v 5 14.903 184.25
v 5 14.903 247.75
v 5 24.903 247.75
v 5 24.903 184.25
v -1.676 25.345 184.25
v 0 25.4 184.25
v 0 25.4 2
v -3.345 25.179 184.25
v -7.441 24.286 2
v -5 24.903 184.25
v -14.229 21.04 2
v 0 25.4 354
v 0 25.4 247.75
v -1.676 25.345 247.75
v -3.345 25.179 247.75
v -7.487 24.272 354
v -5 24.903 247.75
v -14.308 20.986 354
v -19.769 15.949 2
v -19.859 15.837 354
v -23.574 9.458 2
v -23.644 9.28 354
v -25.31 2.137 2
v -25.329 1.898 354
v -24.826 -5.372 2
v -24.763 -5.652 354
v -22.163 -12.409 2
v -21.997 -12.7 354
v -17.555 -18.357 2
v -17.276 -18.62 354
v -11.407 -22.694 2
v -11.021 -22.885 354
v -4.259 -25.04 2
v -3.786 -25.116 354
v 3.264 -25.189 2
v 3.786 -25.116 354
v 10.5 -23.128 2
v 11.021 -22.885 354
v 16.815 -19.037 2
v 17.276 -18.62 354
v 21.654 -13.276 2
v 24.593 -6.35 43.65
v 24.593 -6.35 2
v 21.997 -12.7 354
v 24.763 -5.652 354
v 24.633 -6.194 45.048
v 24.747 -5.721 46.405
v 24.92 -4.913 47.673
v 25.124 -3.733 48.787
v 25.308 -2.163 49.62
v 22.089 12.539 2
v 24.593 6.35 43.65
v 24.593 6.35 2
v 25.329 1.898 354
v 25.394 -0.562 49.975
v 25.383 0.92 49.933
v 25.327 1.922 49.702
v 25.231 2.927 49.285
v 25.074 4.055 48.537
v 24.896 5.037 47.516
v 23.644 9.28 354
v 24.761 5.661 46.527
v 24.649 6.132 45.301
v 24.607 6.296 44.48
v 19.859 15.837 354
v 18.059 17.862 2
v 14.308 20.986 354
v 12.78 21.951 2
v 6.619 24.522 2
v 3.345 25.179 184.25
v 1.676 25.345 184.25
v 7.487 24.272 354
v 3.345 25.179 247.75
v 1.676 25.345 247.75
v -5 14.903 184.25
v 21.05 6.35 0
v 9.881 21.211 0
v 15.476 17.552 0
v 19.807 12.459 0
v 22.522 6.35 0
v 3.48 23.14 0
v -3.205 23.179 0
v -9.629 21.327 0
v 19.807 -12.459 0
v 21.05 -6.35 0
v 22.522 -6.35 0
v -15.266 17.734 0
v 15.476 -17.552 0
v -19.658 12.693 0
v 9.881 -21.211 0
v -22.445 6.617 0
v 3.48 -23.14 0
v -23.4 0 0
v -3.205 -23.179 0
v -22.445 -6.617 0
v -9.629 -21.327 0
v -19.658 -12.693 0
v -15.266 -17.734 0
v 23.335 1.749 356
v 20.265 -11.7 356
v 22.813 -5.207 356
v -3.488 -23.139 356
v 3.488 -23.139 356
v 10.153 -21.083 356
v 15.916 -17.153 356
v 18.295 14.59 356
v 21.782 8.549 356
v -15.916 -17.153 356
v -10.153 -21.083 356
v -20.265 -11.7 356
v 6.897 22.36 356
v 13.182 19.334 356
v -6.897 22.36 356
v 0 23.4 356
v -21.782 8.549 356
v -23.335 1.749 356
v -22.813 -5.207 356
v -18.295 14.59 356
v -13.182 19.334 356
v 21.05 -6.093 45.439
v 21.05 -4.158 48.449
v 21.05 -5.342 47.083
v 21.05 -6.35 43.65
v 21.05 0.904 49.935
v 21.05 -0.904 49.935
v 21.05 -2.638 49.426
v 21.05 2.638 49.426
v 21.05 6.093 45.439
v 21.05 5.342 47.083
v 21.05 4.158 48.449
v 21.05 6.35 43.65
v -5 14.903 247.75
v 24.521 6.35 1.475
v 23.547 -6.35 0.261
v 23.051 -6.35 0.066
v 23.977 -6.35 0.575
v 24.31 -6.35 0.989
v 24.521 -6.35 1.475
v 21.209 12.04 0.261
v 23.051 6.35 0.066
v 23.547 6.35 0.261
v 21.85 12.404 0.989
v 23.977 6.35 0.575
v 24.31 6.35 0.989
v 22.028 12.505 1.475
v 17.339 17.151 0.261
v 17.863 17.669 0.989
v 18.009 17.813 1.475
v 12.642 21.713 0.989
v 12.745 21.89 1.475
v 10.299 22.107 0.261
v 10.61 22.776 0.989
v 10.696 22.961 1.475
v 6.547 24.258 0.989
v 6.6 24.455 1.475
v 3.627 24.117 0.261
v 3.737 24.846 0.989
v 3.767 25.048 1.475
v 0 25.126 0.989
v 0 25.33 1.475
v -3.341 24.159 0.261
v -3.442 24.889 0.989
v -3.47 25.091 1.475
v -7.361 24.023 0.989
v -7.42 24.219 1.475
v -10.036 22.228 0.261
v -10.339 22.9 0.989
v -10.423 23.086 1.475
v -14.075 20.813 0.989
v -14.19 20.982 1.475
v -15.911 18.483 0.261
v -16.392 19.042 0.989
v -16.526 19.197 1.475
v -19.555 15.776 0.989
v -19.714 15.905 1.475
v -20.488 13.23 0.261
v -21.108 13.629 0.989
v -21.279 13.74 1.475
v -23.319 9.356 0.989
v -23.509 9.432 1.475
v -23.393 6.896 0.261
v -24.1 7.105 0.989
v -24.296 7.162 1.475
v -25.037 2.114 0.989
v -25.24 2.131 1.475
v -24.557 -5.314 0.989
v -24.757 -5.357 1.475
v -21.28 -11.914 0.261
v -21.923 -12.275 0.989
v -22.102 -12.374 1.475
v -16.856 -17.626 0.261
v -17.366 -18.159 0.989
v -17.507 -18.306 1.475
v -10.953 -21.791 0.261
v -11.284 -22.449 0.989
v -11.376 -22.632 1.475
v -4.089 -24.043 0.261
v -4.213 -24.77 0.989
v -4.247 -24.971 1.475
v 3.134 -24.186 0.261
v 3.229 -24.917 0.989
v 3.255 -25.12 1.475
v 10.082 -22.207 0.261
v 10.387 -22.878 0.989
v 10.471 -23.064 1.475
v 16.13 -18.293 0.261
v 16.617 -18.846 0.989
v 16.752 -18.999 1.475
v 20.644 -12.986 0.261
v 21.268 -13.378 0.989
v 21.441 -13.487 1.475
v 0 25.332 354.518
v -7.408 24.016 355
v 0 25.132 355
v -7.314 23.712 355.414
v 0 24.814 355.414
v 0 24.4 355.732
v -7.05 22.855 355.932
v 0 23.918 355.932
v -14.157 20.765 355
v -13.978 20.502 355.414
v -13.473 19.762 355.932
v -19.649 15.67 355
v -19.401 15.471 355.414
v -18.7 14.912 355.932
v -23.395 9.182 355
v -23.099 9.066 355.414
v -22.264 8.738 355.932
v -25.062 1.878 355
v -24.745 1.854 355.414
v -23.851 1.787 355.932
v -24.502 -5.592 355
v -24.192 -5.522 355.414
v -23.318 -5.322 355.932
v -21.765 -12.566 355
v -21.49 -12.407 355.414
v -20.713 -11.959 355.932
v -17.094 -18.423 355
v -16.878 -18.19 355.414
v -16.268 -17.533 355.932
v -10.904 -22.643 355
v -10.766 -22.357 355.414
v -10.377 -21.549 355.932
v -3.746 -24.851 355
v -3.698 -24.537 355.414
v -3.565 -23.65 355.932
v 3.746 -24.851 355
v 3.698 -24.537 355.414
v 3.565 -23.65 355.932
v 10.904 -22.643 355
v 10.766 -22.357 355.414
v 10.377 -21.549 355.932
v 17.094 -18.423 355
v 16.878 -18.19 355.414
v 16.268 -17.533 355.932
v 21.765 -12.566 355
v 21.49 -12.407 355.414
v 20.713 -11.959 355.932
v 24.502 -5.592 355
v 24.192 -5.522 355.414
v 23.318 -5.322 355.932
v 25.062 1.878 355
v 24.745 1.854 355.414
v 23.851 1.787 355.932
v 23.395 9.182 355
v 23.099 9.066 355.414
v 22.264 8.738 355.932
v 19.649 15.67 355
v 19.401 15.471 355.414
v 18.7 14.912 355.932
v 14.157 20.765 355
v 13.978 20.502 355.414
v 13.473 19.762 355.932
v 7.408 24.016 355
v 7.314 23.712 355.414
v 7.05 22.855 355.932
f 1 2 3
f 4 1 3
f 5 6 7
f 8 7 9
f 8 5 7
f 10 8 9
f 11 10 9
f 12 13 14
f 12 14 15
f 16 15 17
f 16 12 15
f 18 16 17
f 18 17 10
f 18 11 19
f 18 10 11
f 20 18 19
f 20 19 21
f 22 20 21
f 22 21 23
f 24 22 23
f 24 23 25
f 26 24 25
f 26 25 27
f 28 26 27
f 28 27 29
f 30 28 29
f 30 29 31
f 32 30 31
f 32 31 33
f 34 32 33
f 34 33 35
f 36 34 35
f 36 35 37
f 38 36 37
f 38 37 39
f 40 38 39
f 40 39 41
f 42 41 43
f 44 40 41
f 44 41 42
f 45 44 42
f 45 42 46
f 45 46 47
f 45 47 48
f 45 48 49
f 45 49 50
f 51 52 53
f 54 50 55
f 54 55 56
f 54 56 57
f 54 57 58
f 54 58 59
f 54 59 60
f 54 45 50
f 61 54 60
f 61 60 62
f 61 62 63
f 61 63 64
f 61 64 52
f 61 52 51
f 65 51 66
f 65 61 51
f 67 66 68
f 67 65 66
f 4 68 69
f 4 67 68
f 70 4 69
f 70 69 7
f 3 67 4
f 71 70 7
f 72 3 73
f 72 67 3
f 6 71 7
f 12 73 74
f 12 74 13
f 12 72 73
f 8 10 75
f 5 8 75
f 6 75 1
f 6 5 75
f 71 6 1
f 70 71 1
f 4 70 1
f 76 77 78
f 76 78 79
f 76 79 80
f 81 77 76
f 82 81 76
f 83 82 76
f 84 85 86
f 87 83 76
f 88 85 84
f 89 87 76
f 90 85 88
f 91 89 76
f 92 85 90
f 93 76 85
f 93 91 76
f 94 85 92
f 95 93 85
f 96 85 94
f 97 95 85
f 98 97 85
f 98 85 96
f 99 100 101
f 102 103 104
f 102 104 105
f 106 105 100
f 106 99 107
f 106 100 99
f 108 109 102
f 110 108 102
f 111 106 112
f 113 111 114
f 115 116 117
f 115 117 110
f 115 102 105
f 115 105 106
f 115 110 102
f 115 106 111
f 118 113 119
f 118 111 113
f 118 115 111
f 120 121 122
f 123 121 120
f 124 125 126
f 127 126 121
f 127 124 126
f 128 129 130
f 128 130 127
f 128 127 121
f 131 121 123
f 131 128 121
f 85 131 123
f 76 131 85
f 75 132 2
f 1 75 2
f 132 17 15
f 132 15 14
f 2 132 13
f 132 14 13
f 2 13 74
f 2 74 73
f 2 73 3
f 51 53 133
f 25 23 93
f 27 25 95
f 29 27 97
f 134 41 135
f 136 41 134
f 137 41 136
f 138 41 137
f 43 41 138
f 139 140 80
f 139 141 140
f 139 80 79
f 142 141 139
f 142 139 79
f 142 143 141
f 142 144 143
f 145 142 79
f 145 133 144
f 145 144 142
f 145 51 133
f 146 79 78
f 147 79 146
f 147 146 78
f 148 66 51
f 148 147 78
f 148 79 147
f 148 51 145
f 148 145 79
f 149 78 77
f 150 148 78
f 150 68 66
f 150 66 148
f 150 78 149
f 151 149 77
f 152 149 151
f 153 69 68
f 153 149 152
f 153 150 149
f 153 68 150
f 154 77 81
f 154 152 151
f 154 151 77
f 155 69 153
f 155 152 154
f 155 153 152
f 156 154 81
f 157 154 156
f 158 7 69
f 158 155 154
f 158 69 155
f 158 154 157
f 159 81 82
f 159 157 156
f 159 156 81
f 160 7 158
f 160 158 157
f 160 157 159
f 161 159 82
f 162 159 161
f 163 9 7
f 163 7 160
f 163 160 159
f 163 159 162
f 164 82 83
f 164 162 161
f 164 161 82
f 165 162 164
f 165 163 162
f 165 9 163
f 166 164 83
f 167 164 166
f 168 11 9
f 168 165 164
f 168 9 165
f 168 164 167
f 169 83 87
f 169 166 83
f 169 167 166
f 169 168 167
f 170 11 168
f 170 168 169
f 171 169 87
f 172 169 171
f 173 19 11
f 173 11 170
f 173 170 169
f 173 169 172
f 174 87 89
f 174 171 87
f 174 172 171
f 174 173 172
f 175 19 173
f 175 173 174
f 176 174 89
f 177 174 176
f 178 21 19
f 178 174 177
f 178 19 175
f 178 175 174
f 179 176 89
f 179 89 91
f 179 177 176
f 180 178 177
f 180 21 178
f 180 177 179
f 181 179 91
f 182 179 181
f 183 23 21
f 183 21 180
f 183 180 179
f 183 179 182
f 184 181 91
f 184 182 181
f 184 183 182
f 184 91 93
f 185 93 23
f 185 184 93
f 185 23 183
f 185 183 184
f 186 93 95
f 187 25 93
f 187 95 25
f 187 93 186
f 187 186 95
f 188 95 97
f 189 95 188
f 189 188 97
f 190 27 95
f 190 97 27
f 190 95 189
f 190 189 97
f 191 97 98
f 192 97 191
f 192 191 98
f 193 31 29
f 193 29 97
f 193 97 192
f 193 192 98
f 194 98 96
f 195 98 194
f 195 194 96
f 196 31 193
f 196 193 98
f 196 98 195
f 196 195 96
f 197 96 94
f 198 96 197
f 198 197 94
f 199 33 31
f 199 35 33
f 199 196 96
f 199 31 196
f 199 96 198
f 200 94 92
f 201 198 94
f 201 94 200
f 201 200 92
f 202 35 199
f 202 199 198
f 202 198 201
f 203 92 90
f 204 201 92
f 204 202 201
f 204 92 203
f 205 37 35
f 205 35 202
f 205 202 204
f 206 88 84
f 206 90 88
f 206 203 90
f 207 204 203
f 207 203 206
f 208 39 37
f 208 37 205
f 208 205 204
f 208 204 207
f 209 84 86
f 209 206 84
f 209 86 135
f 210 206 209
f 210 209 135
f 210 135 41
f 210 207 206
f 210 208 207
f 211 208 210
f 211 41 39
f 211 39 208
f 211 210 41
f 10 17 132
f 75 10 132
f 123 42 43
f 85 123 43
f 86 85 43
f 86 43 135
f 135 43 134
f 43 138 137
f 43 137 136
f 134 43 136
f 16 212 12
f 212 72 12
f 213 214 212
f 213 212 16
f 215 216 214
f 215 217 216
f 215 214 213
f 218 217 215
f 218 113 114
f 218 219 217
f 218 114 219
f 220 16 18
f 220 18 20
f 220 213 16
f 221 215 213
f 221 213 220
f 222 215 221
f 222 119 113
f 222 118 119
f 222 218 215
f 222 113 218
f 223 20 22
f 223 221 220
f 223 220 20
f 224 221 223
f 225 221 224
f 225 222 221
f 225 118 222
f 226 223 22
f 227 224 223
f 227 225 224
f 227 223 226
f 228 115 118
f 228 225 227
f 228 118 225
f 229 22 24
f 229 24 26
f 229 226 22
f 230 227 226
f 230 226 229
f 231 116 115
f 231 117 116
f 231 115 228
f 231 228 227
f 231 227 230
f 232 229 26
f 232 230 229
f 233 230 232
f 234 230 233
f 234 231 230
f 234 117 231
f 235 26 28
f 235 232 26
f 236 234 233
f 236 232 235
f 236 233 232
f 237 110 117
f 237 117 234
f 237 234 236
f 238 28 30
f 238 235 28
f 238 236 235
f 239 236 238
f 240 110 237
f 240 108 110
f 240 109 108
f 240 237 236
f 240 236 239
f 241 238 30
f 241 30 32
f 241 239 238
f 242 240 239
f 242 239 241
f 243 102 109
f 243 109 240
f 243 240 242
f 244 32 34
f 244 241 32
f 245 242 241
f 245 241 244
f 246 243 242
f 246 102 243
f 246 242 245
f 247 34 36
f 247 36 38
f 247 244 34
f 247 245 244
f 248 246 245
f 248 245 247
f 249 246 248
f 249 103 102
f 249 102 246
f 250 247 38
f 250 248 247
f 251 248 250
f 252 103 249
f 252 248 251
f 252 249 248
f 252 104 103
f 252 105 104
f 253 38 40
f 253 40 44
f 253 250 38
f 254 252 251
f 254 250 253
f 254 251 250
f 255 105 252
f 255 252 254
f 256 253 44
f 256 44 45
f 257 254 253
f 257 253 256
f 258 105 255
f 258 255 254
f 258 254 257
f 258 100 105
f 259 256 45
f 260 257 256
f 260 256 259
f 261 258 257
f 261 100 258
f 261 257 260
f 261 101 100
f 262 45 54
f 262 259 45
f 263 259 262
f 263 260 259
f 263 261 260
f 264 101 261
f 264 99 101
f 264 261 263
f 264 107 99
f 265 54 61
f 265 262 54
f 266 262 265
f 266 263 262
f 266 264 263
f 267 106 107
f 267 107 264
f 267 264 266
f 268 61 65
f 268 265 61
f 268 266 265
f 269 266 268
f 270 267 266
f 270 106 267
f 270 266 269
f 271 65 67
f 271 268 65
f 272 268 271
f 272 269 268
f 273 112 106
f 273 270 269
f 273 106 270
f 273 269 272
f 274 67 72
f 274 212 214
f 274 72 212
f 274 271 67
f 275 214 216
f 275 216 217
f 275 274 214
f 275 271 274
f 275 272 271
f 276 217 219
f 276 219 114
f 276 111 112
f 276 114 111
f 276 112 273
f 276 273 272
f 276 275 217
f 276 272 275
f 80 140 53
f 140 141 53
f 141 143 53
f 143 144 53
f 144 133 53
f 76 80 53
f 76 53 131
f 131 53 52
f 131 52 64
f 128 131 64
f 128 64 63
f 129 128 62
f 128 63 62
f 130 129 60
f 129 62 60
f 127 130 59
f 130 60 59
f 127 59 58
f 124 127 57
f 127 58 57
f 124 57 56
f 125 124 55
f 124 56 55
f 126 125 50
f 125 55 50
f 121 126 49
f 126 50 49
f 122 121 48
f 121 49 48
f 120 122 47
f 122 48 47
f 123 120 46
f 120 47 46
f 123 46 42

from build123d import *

# Parameters (mm, degrees)
CUT_EXTRUDE7_DEPTH = 4.35
CUT_EXTRUDE8_DEPTH = 63.5


with BuildPart() as part:
    # Sketch1 → Revolve1 (revolve)
    with BuildSketch(Plane(origin=(0, 0, 0), x_dir=(0, 0, -1), z_dir=(1, 0, 0))):
        with BuildLine():
            Line((0, 0), (0, 23.4))
            ThreePointArc((0, 23.4), (-0.585786438, 24.814213562), (-2, 25.4))
            Line((-2, 25.4), (-354, 25.4))
            ThreePointArc((-354, 25.4), (-355.414213562, 24.814213562), (-356, 23.4))
            Line((-356, 23.4), (-356, 0))
            Line((-356, 0), (0, 0))
        make_face()
    revolve(axis=Axis((0, 0, 0), (0, 0, 1)))

    # Sketch6 → Cut-Extrude7 (cut)
    with BuildSketch(Plane(origin=(25.4, 0, 0), x_dir=(0, 0, -1), z_dir=(1, 0, 0))):
        with BuildLine():
            Line((0, 6.35), (-43.65, 6.35))
            ThreePointArc((-43.65, 6.35), (-50, 0), (-43.65, -6.35))
            Line((-43.65, -6.35), (0, -6.35))
            Line((0, -6.35), (0, 6.35))
        make_face()
    extrude(amount=-CUT_EXTRUDE7_DEPTH, mode=Mode.SUBTRACT)

    # Sketch7 → Cut-Extrude8 (cut)
    with BuildSketch(Plane.XY.offset(247.75)):
        with BuildLine():
            Line((-5, 24.903011866), (-5, 14.903011866))
            Line((-5, 14.903011866), (5, 14.903011866))
            Line((5, 14.903011866), (5, 24.903011866))
            ThreePointArc((5, 24.903011866), (0, 25.4), (-5, 24.903011866))
        make_face()
    extrude(amount=-CUT_EXTRUDE8_DEPTH, mode=Mode.SUBTRACT)


solid = part.part
